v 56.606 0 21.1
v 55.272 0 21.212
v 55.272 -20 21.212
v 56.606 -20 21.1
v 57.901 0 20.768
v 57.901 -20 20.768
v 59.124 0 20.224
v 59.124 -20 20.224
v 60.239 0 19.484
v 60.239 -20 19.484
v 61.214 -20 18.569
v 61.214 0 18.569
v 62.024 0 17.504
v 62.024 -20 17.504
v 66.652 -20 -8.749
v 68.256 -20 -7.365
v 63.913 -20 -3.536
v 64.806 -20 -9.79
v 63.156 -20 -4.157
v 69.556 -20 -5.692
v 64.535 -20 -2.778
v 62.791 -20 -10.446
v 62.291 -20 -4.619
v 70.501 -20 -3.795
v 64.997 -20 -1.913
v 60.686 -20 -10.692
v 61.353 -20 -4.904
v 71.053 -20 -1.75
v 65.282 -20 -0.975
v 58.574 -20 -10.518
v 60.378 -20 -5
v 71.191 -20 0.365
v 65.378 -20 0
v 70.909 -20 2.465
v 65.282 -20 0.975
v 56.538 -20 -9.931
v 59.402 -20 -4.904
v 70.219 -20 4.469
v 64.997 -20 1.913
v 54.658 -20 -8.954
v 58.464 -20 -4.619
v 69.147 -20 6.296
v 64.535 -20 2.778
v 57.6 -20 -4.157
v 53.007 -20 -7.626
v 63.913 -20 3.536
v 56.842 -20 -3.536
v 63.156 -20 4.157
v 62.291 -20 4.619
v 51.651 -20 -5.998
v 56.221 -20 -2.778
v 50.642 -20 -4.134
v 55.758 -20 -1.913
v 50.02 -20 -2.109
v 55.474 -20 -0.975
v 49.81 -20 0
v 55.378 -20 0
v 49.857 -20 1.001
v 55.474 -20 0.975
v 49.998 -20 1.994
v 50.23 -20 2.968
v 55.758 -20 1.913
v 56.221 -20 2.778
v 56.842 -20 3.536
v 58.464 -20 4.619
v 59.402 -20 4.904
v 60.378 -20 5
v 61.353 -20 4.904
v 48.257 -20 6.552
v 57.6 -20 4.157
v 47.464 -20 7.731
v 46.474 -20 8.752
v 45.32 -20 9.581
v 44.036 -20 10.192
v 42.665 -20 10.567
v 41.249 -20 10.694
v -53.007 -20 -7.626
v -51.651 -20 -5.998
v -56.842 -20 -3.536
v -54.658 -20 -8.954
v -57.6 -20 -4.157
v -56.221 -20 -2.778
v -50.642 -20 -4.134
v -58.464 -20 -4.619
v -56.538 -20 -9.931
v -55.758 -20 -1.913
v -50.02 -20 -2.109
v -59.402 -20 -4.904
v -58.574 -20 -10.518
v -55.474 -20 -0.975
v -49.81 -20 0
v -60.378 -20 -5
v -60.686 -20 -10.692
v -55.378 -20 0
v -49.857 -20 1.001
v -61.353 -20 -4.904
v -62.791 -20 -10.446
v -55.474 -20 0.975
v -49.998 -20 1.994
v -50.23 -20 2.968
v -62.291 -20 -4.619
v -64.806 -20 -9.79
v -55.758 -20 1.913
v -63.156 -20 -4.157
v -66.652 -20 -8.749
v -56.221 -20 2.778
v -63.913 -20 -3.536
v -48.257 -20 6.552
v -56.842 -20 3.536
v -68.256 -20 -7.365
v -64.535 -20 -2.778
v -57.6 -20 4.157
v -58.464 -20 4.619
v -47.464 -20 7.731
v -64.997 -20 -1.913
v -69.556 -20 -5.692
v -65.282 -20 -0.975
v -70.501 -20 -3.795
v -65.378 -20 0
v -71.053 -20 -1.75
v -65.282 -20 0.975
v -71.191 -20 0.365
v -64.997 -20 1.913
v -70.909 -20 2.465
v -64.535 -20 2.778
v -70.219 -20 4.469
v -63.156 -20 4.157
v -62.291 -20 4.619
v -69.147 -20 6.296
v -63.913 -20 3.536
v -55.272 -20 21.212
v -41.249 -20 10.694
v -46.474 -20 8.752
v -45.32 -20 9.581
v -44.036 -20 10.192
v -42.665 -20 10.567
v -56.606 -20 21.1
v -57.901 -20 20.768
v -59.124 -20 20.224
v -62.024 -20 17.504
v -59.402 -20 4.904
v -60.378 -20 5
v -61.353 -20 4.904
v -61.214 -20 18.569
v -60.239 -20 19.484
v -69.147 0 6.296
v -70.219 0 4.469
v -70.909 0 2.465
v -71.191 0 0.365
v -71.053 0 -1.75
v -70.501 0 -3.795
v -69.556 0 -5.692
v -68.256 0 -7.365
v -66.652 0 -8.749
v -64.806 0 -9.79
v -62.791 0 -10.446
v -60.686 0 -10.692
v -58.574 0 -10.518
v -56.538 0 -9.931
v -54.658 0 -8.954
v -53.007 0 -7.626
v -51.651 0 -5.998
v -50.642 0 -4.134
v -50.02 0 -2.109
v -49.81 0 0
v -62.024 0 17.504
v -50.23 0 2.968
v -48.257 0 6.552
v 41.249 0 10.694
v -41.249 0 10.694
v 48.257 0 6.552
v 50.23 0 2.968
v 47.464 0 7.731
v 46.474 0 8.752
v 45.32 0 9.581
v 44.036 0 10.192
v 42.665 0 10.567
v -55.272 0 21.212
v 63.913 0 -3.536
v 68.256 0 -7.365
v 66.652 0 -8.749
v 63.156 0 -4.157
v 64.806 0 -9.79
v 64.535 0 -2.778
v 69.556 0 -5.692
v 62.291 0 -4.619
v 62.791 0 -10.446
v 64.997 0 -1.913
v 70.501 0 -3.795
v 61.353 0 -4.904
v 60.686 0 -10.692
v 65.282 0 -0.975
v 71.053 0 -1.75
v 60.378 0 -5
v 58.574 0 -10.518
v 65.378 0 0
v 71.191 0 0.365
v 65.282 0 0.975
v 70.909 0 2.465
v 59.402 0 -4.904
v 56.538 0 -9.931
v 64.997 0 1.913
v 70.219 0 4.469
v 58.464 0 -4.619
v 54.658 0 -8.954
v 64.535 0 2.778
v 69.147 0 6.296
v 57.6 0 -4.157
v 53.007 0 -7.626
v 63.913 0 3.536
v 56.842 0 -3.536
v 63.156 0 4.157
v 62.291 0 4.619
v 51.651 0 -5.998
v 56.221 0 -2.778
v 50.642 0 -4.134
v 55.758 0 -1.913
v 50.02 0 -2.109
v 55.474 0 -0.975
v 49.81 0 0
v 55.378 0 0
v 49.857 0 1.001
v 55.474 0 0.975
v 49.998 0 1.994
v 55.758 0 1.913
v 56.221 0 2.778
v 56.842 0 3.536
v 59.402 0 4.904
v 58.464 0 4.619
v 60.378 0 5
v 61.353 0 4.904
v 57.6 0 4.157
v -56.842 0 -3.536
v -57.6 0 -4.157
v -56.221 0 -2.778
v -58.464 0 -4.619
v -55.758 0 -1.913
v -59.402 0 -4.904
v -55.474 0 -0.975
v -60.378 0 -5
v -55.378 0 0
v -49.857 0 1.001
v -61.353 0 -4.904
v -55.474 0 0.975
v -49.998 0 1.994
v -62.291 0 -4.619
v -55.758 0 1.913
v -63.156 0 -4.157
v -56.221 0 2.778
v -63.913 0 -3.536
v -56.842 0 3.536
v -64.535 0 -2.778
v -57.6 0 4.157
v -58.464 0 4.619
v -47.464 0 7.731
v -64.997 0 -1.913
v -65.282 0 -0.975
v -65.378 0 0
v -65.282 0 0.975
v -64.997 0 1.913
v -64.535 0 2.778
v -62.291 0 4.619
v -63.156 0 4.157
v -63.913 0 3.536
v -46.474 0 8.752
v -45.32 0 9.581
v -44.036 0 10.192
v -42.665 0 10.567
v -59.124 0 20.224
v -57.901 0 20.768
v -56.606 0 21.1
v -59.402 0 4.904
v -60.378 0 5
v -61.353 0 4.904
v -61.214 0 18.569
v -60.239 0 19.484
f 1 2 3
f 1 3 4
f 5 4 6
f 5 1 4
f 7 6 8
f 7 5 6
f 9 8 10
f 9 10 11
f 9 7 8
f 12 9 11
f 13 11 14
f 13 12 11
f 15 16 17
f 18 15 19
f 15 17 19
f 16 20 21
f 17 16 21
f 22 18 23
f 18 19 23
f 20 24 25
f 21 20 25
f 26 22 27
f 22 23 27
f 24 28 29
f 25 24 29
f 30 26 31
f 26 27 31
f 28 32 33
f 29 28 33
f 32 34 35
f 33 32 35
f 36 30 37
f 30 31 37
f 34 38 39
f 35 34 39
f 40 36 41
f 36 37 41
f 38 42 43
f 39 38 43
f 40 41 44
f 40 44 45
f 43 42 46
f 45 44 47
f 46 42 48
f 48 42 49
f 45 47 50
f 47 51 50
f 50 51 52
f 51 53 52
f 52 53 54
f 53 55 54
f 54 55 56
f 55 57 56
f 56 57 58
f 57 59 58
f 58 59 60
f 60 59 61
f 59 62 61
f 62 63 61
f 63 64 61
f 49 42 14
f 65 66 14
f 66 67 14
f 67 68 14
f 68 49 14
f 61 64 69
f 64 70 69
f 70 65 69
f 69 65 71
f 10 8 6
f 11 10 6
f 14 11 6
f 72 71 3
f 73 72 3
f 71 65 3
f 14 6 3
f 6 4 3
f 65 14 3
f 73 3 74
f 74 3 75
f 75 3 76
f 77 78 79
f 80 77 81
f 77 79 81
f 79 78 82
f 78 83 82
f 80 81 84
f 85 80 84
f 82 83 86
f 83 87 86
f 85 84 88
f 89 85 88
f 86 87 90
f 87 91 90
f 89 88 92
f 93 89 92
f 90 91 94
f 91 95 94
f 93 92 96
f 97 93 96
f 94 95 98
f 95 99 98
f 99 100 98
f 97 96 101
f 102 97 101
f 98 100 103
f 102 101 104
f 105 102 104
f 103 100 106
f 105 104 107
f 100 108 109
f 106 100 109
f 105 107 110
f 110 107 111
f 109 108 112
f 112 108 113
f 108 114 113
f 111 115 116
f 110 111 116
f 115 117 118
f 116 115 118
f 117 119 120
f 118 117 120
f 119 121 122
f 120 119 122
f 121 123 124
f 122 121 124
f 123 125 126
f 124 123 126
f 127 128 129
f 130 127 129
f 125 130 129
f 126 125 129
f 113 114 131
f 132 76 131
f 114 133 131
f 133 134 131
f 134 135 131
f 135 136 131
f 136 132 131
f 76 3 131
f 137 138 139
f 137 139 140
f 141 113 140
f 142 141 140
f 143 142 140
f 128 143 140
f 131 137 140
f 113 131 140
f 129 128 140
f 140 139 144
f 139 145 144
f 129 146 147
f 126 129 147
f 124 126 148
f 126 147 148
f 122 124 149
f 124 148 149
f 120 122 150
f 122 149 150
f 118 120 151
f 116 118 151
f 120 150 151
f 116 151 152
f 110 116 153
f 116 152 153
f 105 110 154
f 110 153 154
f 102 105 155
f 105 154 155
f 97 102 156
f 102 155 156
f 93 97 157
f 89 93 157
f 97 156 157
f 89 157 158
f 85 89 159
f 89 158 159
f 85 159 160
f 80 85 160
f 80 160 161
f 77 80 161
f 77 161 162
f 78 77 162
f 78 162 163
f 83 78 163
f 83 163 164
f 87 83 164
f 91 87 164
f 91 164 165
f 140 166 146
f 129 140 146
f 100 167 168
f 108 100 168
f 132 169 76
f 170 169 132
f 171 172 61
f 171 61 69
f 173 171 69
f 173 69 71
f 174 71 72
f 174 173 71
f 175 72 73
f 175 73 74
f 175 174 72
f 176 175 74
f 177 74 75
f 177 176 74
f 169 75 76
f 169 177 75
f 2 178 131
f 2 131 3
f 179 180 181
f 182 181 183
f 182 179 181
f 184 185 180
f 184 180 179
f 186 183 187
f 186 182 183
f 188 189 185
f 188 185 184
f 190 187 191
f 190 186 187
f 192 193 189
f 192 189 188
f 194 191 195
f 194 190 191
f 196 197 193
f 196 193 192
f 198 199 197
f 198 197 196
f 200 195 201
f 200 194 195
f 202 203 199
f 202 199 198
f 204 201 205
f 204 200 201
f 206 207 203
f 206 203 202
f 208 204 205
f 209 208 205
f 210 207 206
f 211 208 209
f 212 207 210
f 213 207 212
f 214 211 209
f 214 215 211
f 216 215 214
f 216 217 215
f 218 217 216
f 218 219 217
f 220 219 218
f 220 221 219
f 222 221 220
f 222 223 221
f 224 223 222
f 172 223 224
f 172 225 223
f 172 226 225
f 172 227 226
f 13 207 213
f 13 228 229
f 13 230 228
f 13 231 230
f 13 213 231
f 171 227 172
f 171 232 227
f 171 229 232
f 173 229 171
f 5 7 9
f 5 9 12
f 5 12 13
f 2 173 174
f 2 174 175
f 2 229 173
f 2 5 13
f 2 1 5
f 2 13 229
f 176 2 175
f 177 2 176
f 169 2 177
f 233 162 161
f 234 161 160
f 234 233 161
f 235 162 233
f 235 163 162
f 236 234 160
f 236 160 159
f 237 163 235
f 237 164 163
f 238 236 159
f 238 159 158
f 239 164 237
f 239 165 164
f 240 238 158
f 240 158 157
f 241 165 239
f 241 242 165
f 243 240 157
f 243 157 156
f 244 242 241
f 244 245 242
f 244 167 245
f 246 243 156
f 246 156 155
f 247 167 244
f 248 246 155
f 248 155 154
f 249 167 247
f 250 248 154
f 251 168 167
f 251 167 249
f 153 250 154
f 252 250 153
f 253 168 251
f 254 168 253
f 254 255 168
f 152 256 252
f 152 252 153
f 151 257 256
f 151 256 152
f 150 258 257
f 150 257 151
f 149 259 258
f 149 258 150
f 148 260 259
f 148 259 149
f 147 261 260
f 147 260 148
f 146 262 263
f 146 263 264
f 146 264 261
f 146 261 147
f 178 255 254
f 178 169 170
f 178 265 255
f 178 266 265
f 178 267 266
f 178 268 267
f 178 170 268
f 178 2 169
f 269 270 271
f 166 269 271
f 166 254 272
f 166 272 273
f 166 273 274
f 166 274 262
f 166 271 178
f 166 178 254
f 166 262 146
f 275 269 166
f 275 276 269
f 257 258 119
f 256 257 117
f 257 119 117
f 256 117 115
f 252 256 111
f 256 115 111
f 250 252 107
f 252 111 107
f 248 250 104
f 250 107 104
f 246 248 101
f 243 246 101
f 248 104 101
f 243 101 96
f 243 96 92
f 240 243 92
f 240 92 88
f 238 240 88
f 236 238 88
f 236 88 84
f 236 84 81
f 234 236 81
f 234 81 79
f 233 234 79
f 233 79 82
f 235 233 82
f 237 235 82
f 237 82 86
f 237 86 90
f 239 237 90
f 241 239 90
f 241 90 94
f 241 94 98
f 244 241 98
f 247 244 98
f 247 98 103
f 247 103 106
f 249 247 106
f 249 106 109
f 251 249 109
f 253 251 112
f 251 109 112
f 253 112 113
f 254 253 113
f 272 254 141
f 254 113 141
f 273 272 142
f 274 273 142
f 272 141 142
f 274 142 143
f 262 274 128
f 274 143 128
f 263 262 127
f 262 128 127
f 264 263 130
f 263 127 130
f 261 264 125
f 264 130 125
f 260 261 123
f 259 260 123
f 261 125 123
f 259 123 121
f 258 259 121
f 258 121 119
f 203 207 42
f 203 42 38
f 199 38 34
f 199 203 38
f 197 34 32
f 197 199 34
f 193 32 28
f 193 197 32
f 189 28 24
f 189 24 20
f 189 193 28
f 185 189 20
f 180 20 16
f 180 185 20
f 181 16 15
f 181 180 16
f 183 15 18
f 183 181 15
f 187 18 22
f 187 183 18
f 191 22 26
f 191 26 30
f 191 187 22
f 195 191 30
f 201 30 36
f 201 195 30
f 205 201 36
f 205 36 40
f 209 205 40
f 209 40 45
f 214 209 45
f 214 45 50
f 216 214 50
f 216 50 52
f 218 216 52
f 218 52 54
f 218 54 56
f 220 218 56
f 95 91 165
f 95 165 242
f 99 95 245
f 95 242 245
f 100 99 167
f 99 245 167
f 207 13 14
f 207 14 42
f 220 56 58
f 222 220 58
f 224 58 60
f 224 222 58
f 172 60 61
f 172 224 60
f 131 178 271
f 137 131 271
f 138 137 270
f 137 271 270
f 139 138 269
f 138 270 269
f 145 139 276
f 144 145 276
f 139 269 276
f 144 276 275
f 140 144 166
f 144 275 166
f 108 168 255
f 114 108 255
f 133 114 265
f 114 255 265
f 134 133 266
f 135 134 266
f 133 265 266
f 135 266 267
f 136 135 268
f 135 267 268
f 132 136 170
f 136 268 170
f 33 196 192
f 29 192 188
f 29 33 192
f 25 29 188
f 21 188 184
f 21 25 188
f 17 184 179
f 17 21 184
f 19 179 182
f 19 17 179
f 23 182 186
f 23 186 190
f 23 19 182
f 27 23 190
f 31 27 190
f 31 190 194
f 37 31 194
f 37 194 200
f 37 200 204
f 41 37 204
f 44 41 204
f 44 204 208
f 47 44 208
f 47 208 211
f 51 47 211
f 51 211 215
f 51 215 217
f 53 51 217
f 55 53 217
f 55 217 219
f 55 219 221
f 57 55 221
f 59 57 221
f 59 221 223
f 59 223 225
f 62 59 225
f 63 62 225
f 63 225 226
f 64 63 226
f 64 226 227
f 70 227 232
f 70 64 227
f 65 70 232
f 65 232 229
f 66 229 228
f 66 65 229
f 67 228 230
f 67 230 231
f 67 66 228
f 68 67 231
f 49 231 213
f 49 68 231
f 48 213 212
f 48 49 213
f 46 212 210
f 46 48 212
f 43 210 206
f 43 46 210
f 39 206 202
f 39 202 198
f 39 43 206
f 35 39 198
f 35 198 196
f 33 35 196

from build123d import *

# Parameters (mm, degrees)
F1_DEPTH = 20
F3_D     = 10
F4_DEPTH = 20
F6_D     = 10


with BuildPart() as f1:
    # F0 (on Front) → F1 (new body)
    with BuildSketch(Plane.XZ):
        with BuildLine():
            ThreePointArc((-69.147074, 6.296465), (-63.81471, -10.168074), (-49.810232, 0))
            ThreePointArc((-49.810232, 0), (-49.915818, 1.499006), (-50.230489, 2.96841))
            ThreePointArc((-50.230489, 2.96841), (-58.650888, 10.531798), (-69.147074, 6.296465))
        make_face()
    extrude(amount=F1_DEPTH)

    # F3 (through all)
    with Locations(Plane.XZ.offset(20)):
        with Locations((-60.503781, 0)):
            Hole(F3_D / 2)

    # F0 (on Front) → F4 (join)
    with BuildSketch(Plane.XZ):
        with BuildLine():
            ThreePointArc((-69.147074, 6.296465), (-63.81471, -10.168074), (-49.810232, 0))
            ThreePointArc((-49.810232, 0), (-49.915818, 1.499006), (-50.230489, 2.96841))
            ThreePointArc((-50.230489, 2.96841), (-58.650888, 10.531798), (-69.147074, 6.296465))
        make_face()
        with BuildLine():
            ThreePointArc((-69.147074, 6.296465), (-58.650888, 10.531798), (-50.230489, 2.96841))
            Line((-50.230489, 2.96841), (-48.257435, 6.552011))
            ThreePointArc((-48.257435, 6.552011), (-45.319574, 9.580772), (-41.249421, 10.693549))
            Line((-41.249421, 10.693549), (0, 10.693549))
            Line((0, 10.693549), (0, 21.212202))
            Line((0, 21.212202), (-55.27229, 21.212202))
            ThreePointArc((-55.27229, 21.212202), (-59.123882, 20.223994), (-62.023932, 17.503511))
            Line((-62.023932, 17.503511), (-69.147074, 6.296465))
        make_face()
    extrude(amount=F4_DEPTH)

    # F6 (through all)
    with Locations(Plane(origin=(0, 0, 0), x_dir=(1, 0, 0), z_dir=(0, 1, 0))):
        with Locations((-60.377855, 0)):
            Hole(F6_D / 2)

    # F7: F1 across plane


with BuildPart() as f1_1:
    add(f1.part)
    add(f1.part.mirror(Plane.YZ))


solid = f1_1.part
